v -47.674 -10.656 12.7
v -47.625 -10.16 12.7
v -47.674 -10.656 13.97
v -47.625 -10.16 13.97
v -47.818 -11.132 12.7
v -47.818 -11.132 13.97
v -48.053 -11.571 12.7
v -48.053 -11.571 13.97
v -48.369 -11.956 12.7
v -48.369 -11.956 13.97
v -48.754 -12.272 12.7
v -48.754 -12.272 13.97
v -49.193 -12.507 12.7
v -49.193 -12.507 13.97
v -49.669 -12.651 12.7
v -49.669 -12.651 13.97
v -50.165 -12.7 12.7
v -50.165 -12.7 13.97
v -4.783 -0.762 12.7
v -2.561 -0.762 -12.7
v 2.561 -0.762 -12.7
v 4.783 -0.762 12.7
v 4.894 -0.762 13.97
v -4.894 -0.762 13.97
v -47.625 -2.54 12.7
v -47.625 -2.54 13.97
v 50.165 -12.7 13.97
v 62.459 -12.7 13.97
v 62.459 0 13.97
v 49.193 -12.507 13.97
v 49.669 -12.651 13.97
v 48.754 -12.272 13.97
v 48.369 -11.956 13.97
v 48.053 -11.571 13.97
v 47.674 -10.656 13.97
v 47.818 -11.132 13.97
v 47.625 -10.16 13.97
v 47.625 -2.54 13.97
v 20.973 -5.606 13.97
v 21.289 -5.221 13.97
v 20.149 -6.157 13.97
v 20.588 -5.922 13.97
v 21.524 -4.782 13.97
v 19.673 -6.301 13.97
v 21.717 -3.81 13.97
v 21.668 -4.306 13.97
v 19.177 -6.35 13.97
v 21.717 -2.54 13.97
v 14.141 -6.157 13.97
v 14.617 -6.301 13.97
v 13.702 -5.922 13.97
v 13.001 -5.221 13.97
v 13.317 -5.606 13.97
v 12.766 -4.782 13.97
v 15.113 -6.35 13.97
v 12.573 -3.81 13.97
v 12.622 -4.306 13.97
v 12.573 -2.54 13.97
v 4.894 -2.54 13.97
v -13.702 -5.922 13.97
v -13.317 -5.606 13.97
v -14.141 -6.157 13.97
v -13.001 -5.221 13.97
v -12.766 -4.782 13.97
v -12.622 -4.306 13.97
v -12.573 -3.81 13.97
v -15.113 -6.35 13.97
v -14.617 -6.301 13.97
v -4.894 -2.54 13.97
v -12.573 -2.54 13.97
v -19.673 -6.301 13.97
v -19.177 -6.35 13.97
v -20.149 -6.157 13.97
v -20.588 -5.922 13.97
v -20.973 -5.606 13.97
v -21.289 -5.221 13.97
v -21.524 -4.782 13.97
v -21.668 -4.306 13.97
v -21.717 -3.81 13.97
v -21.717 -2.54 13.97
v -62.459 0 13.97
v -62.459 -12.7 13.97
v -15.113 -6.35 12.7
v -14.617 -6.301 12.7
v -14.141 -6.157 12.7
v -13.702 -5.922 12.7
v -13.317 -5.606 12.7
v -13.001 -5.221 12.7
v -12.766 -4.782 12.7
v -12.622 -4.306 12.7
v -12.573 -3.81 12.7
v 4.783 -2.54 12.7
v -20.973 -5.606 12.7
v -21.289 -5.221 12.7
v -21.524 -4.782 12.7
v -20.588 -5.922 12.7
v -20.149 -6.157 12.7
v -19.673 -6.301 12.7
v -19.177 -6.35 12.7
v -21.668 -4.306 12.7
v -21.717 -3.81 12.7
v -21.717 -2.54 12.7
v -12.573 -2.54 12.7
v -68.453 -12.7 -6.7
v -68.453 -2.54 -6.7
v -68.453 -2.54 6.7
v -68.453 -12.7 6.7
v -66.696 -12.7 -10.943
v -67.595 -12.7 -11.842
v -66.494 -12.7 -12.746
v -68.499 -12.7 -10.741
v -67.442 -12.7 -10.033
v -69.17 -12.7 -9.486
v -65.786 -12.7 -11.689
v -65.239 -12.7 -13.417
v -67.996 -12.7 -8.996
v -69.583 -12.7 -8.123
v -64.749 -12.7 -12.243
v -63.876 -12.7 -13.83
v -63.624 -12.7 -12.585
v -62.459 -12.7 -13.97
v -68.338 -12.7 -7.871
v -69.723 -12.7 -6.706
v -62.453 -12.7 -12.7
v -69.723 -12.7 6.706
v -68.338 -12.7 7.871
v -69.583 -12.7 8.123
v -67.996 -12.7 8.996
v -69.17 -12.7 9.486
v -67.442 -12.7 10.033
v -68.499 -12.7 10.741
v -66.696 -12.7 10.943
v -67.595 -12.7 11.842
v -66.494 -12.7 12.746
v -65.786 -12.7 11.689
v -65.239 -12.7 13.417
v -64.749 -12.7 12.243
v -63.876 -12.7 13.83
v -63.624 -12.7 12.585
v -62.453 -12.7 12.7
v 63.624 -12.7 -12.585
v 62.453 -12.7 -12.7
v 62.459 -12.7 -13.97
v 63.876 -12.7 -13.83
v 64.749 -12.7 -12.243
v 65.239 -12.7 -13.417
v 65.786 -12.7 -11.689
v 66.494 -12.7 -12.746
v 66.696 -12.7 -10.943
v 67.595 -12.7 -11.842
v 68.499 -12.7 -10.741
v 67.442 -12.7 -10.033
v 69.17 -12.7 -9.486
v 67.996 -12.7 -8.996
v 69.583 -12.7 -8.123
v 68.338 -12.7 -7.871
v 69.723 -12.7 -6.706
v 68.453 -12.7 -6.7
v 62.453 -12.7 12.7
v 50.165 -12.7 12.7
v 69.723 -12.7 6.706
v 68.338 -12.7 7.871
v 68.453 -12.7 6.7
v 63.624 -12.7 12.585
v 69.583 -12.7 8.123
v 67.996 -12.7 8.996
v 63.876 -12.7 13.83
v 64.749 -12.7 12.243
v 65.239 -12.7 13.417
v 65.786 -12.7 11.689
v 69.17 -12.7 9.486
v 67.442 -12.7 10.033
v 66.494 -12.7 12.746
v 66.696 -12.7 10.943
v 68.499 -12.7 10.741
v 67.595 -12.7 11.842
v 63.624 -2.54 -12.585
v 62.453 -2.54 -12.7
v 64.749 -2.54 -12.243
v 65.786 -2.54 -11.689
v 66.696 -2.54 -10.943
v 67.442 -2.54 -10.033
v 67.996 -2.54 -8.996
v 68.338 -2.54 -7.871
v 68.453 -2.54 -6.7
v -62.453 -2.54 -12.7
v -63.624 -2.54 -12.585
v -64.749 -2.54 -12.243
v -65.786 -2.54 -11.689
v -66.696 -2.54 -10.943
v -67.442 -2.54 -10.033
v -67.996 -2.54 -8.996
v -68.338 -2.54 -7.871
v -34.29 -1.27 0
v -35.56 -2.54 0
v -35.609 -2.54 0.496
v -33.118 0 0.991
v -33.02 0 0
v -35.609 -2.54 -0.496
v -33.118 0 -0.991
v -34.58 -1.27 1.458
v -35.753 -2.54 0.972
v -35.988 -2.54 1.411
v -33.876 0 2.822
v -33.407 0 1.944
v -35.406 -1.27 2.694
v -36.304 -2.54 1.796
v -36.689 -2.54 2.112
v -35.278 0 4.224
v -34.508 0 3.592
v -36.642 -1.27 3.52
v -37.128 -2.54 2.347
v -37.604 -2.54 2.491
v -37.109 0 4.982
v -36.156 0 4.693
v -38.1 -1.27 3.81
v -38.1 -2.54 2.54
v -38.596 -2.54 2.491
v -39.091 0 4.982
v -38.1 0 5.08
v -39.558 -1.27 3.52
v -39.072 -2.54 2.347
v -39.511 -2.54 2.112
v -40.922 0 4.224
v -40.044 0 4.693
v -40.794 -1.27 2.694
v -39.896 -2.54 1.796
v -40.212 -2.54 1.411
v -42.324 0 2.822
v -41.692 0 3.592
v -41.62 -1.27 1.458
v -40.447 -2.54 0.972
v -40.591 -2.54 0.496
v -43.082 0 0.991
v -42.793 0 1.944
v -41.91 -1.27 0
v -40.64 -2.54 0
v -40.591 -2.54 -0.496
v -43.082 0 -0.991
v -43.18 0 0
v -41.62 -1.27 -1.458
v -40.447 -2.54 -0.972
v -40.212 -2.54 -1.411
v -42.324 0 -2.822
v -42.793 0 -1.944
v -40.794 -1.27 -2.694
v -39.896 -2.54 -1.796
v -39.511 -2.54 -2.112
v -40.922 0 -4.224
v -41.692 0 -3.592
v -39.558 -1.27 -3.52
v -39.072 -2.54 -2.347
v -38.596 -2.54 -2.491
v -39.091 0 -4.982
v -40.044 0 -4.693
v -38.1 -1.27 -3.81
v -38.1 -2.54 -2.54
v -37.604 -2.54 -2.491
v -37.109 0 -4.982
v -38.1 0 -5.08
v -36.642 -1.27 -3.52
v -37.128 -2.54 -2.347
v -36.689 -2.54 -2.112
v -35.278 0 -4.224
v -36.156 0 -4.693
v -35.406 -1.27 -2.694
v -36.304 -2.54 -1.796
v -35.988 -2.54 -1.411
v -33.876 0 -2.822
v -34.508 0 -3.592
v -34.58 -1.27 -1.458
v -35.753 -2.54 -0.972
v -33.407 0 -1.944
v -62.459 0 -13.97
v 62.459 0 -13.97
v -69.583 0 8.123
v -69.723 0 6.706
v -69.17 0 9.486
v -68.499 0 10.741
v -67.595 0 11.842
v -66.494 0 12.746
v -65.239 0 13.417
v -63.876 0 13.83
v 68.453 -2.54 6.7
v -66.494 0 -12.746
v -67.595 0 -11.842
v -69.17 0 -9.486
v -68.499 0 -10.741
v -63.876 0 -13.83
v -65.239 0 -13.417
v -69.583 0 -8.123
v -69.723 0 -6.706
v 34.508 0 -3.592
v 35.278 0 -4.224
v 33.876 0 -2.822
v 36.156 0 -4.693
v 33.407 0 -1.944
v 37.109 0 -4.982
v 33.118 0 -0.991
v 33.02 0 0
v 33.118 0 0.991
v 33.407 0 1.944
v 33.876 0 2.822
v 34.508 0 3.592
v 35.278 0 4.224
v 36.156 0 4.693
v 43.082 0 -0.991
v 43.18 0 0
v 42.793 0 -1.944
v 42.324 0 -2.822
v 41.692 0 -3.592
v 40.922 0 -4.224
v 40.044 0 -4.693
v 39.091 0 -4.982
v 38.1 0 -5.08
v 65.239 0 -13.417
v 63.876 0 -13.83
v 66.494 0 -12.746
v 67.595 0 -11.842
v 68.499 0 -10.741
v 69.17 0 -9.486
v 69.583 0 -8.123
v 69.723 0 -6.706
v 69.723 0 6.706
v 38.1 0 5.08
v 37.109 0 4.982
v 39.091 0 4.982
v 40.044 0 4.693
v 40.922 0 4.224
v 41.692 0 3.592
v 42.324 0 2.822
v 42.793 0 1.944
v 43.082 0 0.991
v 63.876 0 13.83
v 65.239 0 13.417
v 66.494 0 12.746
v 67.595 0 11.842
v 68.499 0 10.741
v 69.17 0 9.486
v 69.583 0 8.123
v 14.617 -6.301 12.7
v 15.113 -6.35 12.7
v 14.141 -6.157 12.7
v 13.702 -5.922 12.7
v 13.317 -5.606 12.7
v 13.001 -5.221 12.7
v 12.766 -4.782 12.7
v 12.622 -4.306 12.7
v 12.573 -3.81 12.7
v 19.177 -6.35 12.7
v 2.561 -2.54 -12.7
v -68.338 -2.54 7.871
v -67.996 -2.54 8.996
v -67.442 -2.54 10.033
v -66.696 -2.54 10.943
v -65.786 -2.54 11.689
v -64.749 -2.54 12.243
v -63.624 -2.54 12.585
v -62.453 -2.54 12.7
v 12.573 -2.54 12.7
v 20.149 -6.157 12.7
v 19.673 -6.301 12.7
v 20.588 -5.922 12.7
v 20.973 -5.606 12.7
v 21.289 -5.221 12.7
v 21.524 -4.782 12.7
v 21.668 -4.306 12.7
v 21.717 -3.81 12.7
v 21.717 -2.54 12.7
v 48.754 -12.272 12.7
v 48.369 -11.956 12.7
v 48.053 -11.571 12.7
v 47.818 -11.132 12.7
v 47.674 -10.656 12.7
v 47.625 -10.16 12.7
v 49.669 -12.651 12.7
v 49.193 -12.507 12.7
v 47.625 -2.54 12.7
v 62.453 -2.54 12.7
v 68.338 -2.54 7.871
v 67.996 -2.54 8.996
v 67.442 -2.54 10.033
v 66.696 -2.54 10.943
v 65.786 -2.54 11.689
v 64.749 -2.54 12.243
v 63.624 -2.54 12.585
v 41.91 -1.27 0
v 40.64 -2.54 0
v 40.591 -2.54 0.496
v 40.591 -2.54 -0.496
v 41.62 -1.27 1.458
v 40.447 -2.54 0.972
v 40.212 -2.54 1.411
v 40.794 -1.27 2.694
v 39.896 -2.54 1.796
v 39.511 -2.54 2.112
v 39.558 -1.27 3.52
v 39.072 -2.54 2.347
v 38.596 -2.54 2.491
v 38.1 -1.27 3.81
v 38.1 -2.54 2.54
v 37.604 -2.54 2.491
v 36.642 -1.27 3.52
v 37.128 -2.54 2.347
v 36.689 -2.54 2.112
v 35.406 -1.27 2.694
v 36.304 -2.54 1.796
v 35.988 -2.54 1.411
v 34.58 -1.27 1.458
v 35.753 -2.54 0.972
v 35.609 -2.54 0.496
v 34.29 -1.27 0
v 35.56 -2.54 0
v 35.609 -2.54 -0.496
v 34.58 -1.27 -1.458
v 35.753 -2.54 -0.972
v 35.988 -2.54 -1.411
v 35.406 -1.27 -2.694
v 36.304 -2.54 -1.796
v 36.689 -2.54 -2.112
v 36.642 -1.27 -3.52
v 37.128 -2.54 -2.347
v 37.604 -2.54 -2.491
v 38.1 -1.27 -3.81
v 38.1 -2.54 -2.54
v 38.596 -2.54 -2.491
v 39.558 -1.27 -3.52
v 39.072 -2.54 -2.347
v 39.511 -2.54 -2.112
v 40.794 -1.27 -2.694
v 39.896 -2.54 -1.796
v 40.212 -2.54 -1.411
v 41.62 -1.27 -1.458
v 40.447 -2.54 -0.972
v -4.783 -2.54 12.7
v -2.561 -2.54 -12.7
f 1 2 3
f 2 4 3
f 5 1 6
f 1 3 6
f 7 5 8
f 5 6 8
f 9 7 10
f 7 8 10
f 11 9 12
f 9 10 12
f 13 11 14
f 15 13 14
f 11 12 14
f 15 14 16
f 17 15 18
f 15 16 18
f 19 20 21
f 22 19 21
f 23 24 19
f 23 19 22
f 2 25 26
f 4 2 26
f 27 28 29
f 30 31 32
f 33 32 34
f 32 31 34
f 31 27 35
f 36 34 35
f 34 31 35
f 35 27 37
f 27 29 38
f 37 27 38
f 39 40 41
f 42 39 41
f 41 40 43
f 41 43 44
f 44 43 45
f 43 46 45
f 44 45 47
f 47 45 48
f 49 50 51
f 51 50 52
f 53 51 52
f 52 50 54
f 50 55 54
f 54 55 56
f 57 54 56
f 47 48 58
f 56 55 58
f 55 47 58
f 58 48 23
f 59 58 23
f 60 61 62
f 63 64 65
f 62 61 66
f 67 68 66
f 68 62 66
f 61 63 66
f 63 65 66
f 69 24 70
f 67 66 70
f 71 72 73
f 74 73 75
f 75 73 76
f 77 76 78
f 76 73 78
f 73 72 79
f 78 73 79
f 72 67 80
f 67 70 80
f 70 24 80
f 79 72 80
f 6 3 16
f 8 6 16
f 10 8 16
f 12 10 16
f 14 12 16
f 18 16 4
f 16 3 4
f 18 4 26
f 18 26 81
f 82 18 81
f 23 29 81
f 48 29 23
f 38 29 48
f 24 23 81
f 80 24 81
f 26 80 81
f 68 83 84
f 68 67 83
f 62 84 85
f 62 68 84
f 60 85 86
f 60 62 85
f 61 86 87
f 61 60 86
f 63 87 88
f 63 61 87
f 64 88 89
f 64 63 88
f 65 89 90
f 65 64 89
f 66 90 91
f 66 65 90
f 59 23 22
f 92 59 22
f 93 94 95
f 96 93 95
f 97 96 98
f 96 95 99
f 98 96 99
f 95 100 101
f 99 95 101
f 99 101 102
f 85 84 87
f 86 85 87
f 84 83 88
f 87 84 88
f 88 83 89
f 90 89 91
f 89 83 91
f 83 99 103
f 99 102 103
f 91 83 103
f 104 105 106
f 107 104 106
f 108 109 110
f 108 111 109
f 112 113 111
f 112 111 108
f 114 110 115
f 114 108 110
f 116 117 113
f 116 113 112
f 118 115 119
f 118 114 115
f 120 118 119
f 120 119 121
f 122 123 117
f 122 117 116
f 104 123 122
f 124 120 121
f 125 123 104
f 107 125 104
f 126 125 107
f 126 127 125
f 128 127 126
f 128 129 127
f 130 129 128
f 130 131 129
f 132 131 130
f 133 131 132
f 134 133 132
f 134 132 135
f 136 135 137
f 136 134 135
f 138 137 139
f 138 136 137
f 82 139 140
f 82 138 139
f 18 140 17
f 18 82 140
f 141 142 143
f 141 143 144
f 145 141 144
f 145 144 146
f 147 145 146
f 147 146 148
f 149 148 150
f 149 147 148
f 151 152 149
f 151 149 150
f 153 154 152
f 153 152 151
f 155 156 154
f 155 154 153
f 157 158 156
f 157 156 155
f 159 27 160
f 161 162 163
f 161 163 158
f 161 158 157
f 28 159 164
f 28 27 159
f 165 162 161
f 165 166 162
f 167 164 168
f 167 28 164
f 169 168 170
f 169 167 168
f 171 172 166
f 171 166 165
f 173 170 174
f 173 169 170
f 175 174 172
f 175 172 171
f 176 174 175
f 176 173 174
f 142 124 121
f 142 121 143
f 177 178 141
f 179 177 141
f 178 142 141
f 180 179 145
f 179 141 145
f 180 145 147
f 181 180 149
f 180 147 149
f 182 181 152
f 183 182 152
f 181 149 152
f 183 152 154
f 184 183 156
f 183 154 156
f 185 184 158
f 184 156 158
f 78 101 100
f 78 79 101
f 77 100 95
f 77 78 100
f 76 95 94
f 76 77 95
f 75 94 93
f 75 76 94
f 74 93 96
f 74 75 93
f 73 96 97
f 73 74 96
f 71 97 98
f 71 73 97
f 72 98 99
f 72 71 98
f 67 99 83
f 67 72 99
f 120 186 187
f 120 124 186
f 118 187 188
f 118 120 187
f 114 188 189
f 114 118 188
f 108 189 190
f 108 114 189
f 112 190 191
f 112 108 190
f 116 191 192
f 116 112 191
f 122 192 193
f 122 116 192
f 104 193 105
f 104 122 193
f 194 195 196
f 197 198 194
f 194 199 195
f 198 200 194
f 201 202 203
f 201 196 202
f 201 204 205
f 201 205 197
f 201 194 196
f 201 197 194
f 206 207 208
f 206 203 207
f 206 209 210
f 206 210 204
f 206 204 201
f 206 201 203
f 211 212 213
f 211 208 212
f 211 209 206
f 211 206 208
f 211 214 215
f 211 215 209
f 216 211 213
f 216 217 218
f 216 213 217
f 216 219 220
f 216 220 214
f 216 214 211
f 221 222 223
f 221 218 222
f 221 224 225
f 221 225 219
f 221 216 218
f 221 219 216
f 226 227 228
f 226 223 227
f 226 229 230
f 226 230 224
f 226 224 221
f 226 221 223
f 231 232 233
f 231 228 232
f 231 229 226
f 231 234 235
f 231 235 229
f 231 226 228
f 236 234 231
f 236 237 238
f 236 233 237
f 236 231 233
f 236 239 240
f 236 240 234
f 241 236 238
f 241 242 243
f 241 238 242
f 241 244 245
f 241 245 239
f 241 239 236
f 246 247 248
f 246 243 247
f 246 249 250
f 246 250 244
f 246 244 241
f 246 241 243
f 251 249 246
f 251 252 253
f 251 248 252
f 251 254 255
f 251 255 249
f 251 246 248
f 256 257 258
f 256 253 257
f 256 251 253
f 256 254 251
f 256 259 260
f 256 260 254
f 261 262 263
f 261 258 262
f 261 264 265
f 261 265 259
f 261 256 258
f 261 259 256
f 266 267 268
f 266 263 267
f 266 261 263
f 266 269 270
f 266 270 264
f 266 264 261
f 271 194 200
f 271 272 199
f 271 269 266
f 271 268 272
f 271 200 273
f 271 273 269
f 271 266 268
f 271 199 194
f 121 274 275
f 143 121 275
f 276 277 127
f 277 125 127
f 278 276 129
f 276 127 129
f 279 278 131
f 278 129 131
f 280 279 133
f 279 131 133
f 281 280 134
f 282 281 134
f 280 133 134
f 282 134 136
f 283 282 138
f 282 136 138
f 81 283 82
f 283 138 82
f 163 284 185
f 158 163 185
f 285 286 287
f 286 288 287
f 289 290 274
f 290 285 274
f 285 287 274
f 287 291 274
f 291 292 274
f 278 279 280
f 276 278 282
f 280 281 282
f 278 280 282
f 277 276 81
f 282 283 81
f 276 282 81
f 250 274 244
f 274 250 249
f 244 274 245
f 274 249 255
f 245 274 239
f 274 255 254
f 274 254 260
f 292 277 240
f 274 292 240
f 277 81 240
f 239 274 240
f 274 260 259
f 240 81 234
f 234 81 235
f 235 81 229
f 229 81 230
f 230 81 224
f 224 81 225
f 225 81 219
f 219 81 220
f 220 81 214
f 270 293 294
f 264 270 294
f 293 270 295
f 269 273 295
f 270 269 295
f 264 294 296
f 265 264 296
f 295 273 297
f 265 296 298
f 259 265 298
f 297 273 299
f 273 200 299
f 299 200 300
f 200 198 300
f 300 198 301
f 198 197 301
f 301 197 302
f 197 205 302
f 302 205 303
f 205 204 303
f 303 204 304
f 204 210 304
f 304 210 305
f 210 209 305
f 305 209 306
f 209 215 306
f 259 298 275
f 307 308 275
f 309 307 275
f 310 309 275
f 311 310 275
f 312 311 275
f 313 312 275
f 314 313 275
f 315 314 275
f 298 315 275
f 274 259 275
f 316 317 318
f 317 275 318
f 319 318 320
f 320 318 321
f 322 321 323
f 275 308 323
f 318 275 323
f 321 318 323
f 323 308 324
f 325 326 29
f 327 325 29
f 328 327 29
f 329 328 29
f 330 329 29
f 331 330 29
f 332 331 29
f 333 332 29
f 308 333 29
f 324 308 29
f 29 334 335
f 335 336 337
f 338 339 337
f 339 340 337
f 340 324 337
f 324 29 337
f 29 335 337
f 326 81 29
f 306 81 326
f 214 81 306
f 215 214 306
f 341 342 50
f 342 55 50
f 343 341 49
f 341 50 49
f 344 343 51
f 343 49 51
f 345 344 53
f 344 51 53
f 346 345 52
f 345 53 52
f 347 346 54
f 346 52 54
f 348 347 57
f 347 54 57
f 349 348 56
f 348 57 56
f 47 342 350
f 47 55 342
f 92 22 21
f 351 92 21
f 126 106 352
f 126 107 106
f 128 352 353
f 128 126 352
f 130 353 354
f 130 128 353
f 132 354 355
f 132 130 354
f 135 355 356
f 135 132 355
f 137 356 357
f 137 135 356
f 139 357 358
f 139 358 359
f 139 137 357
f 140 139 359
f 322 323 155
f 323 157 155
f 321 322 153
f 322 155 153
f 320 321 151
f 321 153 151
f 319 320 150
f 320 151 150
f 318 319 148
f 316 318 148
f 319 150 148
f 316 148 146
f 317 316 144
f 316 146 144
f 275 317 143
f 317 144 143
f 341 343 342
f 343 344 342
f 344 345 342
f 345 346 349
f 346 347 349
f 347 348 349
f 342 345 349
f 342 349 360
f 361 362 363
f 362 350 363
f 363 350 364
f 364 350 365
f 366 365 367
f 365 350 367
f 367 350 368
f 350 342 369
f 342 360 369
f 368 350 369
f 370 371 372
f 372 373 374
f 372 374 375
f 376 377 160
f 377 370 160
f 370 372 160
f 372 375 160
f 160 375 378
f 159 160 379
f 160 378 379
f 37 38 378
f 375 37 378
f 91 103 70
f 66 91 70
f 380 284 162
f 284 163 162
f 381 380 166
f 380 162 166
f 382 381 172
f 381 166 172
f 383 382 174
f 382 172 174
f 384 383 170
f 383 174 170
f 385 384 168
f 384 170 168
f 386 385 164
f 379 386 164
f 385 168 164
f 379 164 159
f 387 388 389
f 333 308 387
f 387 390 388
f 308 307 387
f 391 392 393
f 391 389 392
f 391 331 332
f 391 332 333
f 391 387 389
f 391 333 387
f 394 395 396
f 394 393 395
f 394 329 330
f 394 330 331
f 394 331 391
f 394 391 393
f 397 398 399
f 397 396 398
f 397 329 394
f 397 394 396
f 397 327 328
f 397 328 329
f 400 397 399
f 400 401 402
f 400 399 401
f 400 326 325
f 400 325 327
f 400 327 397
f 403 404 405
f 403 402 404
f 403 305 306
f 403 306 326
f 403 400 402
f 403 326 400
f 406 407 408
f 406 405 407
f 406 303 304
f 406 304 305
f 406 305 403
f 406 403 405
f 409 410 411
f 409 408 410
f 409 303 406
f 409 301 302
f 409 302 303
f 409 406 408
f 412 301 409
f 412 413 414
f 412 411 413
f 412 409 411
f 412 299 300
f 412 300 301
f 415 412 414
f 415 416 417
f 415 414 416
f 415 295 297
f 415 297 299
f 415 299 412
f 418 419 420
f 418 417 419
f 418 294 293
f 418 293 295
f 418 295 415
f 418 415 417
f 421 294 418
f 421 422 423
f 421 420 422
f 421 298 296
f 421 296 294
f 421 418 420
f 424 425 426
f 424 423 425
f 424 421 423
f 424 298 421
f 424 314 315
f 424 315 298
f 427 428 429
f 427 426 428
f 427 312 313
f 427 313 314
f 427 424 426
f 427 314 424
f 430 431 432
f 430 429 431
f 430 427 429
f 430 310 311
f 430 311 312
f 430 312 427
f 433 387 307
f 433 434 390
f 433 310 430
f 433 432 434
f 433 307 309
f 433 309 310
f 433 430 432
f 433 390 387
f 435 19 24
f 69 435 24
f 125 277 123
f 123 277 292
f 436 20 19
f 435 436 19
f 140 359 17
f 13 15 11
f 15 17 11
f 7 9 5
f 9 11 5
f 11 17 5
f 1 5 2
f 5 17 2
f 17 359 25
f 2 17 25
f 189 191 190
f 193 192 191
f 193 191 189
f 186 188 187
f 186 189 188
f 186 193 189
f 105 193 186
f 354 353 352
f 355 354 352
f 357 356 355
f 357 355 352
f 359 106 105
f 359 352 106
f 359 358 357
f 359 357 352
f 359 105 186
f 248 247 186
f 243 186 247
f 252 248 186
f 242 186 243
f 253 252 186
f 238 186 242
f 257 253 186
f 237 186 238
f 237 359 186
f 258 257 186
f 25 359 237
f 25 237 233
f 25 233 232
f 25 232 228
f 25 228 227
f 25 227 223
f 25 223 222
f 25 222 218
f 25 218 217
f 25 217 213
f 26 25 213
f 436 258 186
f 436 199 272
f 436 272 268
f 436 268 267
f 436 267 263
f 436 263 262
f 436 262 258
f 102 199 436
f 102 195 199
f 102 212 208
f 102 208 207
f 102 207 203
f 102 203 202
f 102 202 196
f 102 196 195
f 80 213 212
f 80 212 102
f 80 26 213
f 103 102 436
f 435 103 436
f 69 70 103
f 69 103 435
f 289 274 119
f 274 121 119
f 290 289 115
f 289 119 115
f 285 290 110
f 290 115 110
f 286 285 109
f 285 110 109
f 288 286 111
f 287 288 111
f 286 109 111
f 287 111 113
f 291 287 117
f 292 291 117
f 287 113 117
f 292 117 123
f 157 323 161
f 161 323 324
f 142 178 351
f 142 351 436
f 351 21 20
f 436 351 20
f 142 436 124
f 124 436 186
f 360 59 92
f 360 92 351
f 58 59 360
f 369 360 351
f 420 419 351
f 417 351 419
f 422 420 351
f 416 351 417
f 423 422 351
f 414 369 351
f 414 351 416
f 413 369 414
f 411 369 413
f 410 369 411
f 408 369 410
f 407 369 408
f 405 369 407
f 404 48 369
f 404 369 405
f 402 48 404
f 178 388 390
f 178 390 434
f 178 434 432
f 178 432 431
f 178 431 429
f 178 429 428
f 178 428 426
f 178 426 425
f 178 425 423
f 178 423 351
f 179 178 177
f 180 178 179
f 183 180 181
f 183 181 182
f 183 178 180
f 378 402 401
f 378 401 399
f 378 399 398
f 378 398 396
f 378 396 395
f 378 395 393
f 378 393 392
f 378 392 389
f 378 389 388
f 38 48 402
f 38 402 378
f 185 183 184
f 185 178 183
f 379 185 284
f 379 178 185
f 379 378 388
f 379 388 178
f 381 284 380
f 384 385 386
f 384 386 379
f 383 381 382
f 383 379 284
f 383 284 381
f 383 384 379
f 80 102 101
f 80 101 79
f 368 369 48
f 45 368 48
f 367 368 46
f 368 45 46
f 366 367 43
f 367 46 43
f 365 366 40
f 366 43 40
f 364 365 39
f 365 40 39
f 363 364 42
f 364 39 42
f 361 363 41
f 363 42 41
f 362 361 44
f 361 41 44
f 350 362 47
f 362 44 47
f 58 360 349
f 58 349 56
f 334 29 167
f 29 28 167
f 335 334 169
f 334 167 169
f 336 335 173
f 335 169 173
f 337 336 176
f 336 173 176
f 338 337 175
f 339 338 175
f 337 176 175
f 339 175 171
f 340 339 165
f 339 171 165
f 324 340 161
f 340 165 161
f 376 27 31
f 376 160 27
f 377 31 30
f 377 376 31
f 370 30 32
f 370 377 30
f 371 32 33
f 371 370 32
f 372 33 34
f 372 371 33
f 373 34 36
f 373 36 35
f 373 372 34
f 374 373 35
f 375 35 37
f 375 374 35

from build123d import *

# Parameters (mm, degrees)
F1_DEPTH  = 12.7
F2_DEPTH  = 2.54
F3_R      = 6
F4_R      = 7.2644
F5_R      = 2.54
F6_DEPTH  = 25.4
F6_TAPER  = -45
F0_W      = 9.144
F0_H      = 1.27
F7_DEPTH  = 6.35
F0_W_2    = 25.908
F8_DEPTH  = 2.54
F9_R      = 2.54
F10_DEPTH = 0.762


with BuildPart() as f1:
    # F0 (on Front) → F1 (new body)
    with BuildSketch(Plane.XZ):
        Polygon((-47.625, 13.97), (-69.723, 13.97), (-69.723, -13.97), (69.723, -13.97), (69.723, 13.97), (47.625, 13.97), (47.625, 12.7), (68.453, 12.7), (68.453, -12.7), (2.5605612715, -12.7), (-2.5605612715, -12.7), (-68.453, -12.7), (-68.453, 12.7), (-47.625, 12.7), align=None)
    extrude(amount=F1_DEPTH)

    # F0 (on Front) → F2 (join)
    with BuildSketch(Plane.XZ):
        Polygon((-21.717, 12.7), (-47.625, 12.7), (-68.453, 12.7), (-68.453, -12.7), (-2.5605612715, -12.7), (-4.782773325, 12.7), (-12.573, 12.7), align=None)
        Polygon((68.453, 12.7), (47.625, 12.7), (21.717, 12.7), (12.573, 12.7), (4.782773325, 12.7), (2.5605612715, -12.7), (68.453, -12.7), align=None)
    extrude(amount=F2_DEPTH)

    # F3
    f3_edges = [f1.edges().sort_by_distance(p)[0] for p in [
        (-68.453, -7.62, 12.7),
        (-68.453, -7.62, -12.7),
        (68.453, -7.62, 12.7),
        (68.453, -7.62, -12.7),
    ]]
    fillet(f3_edges, radius=F3_R)

    # F4
    f4_edges = [f1.edges().sort_by_distance(p)[0] for p in [
        (-69.723, -6.35, 13.97),
        (-69.723, -6.35, -13.97),
        (69.723, -6.35, -13.97),
        (69.723, -6.35, 13.97),
    ]]
    fillet(f4_edges, radius=F4_R)

    # F5 (on face) → F6 (cut)
    with BuildSketch(Plane.XZ.offset(2.54)):
        with Locations((-38.1, 0)):
            Circle(F5_R)
        with Locations((38.1, 0)):
            Circle(F5_R)
    extrude(amount=-F6_DEPTH, taper=F6_TAPER, mode=Mode.SUBTRACT)

    # F0 (on Front) → F7 (join)
    with BuildSketch(Plane.XZ):
        with Locations((17.145, 13.335)):
            Rectangle(F0_W, F0_H)
        with Locations((-17.145, 13.335)):
            Rectangle(F0_W, F0_H)
    extrude(amount=F7_DEPTH)

    # F0 (on Front) → F8 (join)
    with BuildSketch(Plane.XZ):
        with Locations((34.671, 13.335)):
            Rectangle(F0_W_2, F0_H)
        Polygon((12.573, 13.97), (4.8938839277, 13.97), (4.782773325, 12.7), (12.573, 12.7), align=None)
        with Locations((-34.671, 13.335)):
            Rectangle(F0_W_2, F0_H)
        Polygon((-4.8938839277, 13.97), (-12.573, 13.97), (-12.573, 12.7), (-4.782773325, 12.7), align=None)
    extrude(amount=F8_DEPTH)

    # F9
    f9_edges = [f1.edges().sort_by_distance(p)[0] for p in [
        (47.625, -12.7, 13.335),
        (21.717, -6.35, 13.335),
        (12.573, -6.35, 13.335),
        (-12.573, -6.35, 13.335),
        (-21.717, -6.35, 13.335),
        (-47.625, -12.7, 13.335),
    ]]
    fillet(f9_edges, radius=F9_R)

    # F0 (on Front) → F10 (join)
    with BuildSketch(Plane.XZ):
        Polygon((4.782773325, 12.7), (-4.782773325, 12.7), (-2.5605612715, -12.7), (2.5605612715, -12.7), align=None)
        Polygon((4.8938839277, 13.97), (-4.8938839277, 13.97), (-4.782773325, 12.7), (4.782773325, 12.7), align=None)
    extrude(amount=F10_DEPTH)


solid = f1.part
